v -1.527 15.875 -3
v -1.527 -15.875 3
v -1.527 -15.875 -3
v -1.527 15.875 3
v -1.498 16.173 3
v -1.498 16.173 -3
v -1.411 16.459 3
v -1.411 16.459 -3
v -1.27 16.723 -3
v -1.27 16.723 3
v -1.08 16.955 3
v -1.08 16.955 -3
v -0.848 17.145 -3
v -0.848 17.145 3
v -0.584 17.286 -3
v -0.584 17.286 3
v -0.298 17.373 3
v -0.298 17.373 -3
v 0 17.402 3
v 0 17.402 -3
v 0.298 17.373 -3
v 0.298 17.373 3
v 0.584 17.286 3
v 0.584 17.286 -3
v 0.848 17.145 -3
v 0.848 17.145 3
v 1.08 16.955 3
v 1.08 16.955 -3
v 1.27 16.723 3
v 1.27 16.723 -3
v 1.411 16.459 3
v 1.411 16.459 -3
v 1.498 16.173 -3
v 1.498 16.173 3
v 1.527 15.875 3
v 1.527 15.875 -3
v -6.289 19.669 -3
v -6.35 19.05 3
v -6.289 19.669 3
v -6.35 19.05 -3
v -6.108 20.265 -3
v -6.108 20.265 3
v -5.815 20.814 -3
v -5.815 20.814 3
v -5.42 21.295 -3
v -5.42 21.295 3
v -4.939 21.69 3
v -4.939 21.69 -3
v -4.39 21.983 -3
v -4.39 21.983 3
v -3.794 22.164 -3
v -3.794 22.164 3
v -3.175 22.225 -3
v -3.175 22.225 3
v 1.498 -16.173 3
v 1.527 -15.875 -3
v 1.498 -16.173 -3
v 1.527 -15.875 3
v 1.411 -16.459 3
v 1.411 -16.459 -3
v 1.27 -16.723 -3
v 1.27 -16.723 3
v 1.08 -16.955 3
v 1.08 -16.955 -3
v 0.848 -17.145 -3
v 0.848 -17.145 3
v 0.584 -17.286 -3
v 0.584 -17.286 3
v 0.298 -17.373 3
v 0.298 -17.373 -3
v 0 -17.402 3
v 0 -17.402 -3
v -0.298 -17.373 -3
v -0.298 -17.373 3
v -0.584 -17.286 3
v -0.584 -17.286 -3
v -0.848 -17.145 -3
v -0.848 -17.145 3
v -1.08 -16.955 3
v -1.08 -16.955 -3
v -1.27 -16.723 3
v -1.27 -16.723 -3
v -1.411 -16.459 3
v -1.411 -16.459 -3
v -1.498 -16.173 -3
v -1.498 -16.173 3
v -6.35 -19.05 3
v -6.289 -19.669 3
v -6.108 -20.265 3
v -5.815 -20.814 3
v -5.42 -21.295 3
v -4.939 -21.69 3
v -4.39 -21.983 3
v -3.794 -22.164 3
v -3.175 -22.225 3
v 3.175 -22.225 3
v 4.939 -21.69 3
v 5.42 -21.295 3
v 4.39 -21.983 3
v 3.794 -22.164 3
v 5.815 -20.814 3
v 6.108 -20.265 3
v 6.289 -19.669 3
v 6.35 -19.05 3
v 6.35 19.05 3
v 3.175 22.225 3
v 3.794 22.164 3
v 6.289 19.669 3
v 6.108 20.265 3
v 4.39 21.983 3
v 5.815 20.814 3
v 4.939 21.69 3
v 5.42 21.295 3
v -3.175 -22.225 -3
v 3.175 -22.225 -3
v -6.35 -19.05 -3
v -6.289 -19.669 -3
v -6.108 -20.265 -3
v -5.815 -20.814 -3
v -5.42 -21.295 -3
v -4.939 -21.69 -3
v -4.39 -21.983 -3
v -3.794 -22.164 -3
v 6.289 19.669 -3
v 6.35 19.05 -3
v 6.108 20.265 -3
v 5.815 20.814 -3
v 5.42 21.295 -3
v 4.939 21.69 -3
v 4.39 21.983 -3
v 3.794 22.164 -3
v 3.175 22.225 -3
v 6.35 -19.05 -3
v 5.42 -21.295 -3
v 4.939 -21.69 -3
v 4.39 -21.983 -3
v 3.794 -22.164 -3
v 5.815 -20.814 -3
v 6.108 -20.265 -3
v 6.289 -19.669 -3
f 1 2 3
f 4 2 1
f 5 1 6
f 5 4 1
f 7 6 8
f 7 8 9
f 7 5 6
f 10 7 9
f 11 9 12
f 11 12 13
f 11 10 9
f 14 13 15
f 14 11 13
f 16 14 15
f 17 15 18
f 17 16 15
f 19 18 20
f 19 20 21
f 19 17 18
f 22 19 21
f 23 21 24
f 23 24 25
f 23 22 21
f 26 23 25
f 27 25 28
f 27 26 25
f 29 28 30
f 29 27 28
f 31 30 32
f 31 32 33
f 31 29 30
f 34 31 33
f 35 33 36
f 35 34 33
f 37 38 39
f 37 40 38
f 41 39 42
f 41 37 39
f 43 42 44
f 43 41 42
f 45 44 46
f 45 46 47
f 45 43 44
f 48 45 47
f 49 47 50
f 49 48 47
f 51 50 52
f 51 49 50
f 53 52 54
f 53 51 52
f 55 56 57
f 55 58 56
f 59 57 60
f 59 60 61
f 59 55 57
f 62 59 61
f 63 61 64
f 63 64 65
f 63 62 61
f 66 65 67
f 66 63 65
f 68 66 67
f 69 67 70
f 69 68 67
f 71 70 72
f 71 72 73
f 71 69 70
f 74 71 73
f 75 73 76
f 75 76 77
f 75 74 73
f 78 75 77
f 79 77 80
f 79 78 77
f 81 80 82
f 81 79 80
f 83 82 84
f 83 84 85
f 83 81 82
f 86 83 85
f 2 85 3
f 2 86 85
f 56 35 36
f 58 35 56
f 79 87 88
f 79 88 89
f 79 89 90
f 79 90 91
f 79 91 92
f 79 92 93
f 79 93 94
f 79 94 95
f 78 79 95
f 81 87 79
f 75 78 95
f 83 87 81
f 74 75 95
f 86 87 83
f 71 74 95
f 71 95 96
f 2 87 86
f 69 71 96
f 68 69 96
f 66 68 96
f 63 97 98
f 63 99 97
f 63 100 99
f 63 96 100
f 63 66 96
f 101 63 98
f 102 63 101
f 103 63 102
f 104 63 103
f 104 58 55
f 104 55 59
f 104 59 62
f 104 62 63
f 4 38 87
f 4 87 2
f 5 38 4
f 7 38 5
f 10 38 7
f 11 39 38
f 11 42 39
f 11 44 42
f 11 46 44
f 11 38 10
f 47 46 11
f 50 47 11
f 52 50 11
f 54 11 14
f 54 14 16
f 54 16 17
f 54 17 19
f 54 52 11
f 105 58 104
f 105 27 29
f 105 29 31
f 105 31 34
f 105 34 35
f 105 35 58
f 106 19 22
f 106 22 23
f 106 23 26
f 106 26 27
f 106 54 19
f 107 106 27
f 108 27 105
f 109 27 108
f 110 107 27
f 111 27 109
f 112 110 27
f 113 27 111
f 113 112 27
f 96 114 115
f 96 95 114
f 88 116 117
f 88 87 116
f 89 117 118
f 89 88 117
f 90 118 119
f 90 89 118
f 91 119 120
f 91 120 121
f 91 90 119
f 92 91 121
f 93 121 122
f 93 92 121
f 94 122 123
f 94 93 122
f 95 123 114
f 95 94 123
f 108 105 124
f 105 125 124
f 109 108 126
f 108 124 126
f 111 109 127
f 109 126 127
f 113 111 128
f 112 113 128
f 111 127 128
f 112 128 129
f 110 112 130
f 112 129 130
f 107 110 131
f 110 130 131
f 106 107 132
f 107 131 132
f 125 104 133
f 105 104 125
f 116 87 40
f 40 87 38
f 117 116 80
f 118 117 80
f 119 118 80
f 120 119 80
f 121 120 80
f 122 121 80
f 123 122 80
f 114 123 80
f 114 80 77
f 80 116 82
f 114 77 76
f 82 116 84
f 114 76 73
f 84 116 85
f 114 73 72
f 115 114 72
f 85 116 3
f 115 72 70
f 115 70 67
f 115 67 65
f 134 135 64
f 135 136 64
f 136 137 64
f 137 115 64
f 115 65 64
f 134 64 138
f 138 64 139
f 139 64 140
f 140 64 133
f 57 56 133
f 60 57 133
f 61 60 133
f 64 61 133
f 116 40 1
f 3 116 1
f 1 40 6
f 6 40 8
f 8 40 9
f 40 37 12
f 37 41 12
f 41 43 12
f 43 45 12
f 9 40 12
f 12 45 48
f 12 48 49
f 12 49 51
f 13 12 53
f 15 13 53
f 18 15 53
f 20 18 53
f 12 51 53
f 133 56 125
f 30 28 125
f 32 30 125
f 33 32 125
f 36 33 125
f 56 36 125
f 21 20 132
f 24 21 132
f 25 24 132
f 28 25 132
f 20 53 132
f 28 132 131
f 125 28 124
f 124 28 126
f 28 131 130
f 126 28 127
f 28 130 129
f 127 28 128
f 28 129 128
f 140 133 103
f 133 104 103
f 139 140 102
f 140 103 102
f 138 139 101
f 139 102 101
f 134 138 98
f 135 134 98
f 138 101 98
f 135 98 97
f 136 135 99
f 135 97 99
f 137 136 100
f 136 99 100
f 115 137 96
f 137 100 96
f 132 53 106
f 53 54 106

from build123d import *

# Parameters (mm, degrees)
SKETCH1_W           = 12.7
SKETCH1_H           = 44.45
BOSS_EXTRUDE1_DEPTH = 3
FILLET1_R           = 3.175


with BuildPart() as part:
    # Sketch1 → Boss-Extrude1 (new, symmetric)
    with BuildSketch(Plane.XY):
        Rectangle(SKETCH1_W, SKETCH1_H)
        with BuildLine():
            Line((1.526908397, 15.875), (1.526908397, -15.875))
            ThreePointArc((1.526908397, -15.875), (0, -17.401908397), (-1.526908397, -15.875))
            Line((-1.526908397, -15.875), (-1.526908397, 15.875))
            ThreePointArc((-1.526908397, 15.875), (0, 17.401908397), (1.526908397, 15.875))
        make_face(mode=Mode.SUBTRACT)
    extrude(amount=BOSS_EXTRUDE1_DEPTH, both=True)

    # Fillet1
    fillet1_edges = [part.edges().sort_by_distance(p)[0] for p in [
        (6.35, -22.225, 0),
        (-6.35, -22.225, 0),
        (-6.35, 22.225, 0),
        (6.35, 22.225, 0),
    ]]
    fillet(fillet1_edges, radius=FILLET1_R)


solid = part.part
